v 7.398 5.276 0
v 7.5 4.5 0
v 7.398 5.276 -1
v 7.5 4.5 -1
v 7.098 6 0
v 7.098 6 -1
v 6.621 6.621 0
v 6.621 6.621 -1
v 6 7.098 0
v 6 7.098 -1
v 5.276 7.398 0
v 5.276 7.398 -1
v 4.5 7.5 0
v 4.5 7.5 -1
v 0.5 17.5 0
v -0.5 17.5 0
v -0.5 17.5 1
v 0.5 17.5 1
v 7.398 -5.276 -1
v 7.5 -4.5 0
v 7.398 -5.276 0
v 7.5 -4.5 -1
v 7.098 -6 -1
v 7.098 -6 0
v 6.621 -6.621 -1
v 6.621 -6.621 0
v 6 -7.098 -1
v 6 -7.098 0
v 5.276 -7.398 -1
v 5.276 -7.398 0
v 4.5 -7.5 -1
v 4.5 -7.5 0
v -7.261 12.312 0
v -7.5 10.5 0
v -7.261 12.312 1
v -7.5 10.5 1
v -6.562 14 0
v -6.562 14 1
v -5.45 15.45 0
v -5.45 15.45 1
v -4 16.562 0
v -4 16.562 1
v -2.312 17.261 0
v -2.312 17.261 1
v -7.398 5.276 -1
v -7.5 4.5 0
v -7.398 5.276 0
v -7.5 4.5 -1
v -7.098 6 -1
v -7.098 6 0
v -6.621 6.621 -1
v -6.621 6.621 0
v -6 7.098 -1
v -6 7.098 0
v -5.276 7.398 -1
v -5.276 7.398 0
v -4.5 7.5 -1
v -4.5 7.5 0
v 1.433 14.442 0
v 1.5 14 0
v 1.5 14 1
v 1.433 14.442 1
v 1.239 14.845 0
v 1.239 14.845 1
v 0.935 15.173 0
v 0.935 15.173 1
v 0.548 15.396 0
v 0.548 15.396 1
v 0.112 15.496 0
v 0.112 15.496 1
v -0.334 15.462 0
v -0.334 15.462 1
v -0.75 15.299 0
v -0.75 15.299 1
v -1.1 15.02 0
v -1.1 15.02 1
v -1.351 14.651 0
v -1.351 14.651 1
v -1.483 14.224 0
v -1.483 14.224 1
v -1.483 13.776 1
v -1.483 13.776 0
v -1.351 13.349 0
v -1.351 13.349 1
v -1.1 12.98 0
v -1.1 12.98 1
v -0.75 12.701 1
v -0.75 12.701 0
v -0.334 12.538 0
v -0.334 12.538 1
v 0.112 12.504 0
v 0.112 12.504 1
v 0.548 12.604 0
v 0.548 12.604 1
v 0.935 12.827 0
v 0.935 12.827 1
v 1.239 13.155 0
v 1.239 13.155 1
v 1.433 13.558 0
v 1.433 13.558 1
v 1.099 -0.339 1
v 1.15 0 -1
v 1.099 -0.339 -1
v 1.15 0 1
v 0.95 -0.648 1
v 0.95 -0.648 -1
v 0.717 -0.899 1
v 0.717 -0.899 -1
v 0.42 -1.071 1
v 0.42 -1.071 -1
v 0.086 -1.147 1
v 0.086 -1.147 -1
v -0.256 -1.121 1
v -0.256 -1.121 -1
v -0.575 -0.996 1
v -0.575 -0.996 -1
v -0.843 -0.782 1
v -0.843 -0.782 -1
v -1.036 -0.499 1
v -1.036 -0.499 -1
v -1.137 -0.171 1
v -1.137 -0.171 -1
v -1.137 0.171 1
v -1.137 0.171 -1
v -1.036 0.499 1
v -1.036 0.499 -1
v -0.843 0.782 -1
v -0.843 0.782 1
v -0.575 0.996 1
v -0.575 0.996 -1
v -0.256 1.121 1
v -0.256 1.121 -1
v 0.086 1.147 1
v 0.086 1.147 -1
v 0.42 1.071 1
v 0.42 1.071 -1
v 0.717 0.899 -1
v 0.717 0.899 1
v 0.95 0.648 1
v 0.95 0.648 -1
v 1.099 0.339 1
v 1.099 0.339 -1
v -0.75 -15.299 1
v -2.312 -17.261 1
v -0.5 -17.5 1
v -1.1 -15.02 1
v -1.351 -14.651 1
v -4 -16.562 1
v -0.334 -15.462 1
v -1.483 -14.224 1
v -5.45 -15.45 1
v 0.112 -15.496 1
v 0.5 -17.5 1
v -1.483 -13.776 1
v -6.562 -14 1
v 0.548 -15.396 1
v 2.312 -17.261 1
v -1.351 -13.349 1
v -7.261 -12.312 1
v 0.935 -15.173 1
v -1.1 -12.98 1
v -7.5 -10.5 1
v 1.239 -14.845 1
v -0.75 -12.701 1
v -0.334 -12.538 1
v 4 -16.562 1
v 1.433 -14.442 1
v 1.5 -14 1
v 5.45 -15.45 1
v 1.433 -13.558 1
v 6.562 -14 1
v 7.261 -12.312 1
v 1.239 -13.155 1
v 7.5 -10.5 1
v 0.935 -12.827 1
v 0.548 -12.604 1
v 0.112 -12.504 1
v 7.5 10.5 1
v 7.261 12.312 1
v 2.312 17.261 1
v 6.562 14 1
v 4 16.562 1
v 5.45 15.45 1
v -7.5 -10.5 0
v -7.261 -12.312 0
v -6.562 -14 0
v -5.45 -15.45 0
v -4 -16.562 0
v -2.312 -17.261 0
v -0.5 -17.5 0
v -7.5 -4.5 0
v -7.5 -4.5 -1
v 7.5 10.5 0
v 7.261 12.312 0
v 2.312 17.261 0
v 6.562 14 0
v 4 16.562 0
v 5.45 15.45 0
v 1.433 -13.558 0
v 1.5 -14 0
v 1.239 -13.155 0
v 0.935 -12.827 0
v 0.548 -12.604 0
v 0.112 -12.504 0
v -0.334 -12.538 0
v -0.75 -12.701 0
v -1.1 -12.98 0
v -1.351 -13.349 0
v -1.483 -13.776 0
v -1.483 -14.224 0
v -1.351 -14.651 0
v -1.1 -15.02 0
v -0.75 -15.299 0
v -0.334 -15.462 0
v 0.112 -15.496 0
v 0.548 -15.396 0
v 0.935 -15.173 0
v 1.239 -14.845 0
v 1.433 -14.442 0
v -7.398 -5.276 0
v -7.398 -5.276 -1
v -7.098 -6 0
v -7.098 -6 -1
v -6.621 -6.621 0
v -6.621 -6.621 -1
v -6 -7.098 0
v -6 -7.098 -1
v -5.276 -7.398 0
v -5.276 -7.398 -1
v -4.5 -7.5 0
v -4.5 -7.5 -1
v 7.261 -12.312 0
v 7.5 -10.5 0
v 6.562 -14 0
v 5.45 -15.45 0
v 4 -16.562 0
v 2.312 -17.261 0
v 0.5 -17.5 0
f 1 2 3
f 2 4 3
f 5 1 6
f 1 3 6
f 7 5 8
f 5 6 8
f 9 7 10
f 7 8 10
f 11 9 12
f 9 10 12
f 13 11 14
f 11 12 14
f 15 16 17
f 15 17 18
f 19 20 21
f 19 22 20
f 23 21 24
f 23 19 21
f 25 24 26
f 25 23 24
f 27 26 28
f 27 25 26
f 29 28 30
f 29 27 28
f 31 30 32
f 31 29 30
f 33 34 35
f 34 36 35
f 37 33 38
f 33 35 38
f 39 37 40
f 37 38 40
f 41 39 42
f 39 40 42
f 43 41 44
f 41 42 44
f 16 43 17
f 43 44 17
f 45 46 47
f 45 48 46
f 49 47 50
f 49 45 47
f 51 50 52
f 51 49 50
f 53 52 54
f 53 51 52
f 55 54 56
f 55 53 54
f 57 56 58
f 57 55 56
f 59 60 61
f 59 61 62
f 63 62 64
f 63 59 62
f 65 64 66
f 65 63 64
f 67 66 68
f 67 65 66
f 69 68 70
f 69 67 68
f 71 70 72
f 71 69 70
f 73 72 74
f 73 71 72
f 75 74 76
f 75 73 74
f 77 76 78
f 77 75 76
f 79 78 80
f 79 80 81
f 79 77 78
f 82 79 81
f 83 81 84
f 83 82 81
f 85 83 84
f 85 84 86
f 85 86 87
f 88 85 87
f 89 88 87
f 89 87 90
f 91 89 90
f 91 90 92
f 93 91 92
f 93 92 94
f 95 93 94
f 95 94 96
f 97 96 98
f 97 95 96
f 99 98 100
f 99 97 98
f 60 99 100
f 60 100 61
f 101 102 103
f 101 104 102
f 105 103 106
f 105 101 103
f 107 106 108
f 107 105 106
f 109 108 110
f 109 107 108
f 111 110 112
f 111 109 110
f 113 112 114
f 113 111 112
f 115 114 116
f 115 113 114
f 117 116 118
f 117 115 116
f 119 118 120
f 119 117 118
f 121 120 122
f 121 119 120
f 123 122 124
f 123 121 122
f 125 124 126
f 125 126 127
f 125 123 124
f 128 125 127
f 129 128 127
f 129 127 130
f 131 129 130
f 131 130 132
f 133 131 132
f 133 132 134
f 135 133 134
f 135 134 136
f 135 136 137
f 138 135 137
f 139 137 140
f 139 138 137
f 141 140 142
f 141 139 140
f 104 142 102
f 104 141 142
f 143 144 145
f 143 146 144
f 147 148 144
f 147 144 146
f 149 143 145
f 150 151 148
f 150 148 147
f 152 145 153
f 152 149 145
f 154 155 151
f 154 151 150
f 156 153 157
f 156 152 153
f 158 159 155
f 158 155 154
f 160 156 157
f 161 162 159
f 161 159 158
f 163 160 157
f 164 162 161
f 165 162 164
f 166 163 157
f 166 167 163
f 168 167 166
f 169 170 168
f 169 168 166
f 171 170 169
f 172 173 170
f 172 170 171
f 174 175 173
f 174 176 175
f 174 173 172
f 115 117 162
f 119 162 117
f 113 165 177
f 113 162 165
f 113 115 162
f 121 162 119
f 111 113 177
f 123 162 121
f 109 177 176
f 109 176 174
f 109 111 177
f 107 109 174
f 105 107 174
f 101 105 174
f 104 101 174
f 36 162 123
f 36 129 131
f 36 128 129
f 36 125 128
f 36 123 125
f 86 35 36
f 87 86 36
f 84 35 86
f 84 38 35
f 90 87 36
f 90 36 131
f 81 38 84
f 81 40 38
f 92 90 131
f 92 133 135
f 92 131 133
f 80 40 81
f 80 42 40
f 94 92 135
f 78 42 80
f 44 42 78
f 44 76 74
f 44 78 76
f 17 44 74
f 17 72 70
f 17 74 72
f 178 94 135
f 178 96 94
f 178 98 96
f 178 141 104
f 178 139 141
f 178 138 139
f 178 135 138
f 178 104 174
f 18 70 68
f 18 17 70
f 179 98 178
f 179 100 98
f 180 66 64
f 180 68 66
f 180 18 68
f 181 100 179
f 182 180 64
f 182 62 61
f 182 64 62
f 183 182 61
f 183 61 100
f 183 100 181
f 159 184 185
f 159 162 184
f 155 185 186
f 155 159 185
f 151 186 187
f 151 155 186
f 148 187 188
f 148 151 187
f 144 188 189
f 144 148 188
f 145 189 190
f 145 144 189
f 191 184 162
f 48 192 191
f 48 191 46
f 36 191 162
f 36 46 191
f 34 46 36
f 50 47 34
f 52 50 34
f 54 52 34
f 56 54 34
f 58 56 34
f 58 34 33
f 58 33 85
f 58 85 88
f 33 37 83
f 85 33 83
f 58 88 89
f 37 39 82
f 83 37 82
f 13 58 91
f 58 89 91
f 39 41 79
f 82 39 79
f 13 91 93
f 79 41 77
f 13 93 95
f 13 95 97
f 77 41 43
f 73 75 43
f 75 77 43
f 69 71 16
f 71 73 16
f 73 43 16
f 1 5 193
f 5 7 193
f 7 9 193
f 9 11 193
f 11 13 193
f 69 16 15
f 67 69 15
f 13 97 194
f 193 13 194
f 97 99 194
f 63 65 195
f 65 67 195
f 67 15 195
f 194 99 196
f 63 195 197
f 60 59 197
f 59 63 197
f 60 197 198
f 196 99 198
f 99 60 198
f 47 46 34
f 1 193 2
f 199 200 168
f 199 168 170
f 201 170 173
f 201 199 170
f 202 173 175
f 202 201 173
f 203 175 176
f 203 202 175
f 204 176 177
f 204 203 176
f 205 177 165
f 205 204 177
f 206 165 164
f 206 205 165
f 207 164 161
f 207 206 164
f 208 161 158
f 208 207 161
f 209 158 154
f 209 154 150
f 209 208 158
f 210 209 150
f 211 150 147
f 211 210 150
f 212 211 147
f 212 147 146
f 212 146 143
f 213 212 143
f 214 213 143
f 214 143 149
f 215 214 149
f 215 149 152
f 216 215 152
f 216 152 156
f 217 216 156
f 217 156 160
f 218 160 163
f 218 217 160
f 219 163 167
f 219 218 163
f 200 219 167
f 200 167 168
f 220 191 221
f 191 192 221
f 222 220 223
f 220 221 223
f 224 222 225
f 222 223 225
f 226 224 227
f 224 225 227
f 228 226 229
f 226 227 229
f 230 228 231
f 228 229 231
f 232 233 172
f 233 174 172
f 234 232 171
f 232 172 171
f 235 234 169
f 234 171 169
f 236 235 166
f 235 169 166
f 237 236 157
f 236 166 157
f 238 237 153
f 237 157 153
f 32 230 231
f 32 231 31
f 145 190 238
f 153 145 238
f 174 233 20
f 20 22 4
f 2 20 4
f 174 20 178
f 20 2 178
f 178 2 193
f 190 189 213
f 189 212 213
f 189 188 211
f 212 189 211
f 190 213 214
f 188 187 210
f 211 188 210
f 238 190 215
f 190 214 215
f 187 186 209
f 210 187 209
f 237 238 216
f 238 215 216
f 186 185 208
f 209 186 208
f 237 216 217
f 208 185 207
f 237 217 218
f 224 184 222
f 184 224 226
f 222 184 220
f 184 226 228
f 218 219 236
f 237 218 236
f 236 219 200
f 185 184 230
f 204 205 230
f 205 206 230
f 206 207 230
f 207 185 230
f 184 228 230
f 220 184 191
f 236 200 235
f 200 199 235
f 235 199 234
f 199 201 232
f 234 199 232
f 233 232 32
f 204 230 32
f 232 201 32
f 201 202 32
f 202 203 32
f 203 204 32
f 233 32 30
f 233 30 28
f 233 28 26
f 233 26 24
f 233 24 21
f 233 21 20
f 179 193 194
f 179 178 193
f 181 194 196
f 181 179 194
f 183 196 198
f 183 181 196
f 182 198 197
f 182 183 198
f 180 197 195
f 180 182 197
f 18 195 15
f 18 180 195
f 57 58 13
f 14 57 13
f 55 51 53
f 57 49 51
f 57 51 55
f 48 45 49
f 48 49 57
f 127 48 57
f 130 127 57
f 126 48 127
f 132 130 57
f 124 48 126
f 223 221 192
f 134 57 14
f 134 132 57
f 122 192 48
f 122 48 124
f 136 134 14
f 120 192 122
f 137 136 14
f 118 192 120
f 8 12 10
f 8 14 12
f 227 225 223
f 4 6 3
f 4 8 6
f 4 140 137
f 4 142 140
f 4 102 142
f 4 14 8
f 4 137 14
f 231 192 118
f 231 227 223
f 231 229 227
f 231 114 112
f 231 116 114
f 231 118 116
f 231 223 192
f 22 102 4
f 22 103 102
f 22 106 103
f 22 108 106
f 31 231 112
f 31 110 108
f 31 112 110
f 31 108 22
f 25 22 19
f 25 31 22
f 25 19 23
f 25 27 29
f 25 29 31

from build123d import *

# Parameters (mm, degrees)
F0_R     = 2.5
F0_R_2   = 1.15
F1_DEPTH = 1
F2_W     = 15
F2_H     = 15
F2_R     = 5
F2_R_2   = 2.5
F2_R_3   = 1.15
F3_DEPTH = 1
F4_R     = 3
F6_W     = 15
F6_H     = 35
F6_R     = 1.5
F6_R_2   = 1.15
F7_DEPTH = 1
F8_R     = 7


# Not quite as in the source:
# - a feature of the source that left no trace in its solid (it failed there, or was rolled back) is left out


with BuildPart() as f1:
    # F0 (on Top) → F1 (new body)
    with BuildSketch(Plane.XY):
        Circle(F0_R)
        Circle(F0_R_2, mode=Mode.SUBTRACT)
    extrude(amount=F1_DEPTH)

    # F2 (on face) → F3 (join)
    with BuildSketch(Plane(origin=(0, 0, 0), x_dir=(1, 0, 0), z_dir=(0, 0, -1))):
        Rectangle(F2_W, F2_H)
        Circle(F2_R, mode=Mode.SUBTRACT)
        Circle(F2_R)
        Circle(F2_R_2, mode=Mode.SUBTRACT)
        Circle(F2_R_2)
        Circle(F2_R_3, mode=Mode.SUBTRACT)
    extrude(amount=F3_DEPTH)

    # F4
    f4_edges = [f1.edges().sort_by_distance(p)[0] for p in [
        (-7.5, 7.5, -0.5),
        (7.5, 7.5, -0.5),
        (-7.5, -7.5, -0.5),
        (7.5, -7.5, -0.5),
    ]]
    fillet(f4_edges, radius=F4_R)

    # F6 (on face) → F7 (join)
    with BuildSketch(Plane.XY):
        Rectangle(F6_W, F6_H)
        with Locations((0, -14)):
            Circle(F6_R, mode=Mode.SUBTRACT)
        Circle(F6_R_2, mode=Mode.SUBTRACT)
        with Locations((0, 14)):
            Circle(F6_R, mode=Mode.SUBTRACT)
    extrude(amount=F7_DEPTH)

    # F8
    f8_edges = [f1.edges().sort_by_distance(p)[0] for p in [
        (-7.5, 17.5, 0.5),
        (7.5, 17.5, 0.5),
        (7.5, -17.5, 0.5),
        (-7.5, -17.5, 0.5),
    ]]
    fillet(f8_edges, radius=F8_R)


solid = f1.part
